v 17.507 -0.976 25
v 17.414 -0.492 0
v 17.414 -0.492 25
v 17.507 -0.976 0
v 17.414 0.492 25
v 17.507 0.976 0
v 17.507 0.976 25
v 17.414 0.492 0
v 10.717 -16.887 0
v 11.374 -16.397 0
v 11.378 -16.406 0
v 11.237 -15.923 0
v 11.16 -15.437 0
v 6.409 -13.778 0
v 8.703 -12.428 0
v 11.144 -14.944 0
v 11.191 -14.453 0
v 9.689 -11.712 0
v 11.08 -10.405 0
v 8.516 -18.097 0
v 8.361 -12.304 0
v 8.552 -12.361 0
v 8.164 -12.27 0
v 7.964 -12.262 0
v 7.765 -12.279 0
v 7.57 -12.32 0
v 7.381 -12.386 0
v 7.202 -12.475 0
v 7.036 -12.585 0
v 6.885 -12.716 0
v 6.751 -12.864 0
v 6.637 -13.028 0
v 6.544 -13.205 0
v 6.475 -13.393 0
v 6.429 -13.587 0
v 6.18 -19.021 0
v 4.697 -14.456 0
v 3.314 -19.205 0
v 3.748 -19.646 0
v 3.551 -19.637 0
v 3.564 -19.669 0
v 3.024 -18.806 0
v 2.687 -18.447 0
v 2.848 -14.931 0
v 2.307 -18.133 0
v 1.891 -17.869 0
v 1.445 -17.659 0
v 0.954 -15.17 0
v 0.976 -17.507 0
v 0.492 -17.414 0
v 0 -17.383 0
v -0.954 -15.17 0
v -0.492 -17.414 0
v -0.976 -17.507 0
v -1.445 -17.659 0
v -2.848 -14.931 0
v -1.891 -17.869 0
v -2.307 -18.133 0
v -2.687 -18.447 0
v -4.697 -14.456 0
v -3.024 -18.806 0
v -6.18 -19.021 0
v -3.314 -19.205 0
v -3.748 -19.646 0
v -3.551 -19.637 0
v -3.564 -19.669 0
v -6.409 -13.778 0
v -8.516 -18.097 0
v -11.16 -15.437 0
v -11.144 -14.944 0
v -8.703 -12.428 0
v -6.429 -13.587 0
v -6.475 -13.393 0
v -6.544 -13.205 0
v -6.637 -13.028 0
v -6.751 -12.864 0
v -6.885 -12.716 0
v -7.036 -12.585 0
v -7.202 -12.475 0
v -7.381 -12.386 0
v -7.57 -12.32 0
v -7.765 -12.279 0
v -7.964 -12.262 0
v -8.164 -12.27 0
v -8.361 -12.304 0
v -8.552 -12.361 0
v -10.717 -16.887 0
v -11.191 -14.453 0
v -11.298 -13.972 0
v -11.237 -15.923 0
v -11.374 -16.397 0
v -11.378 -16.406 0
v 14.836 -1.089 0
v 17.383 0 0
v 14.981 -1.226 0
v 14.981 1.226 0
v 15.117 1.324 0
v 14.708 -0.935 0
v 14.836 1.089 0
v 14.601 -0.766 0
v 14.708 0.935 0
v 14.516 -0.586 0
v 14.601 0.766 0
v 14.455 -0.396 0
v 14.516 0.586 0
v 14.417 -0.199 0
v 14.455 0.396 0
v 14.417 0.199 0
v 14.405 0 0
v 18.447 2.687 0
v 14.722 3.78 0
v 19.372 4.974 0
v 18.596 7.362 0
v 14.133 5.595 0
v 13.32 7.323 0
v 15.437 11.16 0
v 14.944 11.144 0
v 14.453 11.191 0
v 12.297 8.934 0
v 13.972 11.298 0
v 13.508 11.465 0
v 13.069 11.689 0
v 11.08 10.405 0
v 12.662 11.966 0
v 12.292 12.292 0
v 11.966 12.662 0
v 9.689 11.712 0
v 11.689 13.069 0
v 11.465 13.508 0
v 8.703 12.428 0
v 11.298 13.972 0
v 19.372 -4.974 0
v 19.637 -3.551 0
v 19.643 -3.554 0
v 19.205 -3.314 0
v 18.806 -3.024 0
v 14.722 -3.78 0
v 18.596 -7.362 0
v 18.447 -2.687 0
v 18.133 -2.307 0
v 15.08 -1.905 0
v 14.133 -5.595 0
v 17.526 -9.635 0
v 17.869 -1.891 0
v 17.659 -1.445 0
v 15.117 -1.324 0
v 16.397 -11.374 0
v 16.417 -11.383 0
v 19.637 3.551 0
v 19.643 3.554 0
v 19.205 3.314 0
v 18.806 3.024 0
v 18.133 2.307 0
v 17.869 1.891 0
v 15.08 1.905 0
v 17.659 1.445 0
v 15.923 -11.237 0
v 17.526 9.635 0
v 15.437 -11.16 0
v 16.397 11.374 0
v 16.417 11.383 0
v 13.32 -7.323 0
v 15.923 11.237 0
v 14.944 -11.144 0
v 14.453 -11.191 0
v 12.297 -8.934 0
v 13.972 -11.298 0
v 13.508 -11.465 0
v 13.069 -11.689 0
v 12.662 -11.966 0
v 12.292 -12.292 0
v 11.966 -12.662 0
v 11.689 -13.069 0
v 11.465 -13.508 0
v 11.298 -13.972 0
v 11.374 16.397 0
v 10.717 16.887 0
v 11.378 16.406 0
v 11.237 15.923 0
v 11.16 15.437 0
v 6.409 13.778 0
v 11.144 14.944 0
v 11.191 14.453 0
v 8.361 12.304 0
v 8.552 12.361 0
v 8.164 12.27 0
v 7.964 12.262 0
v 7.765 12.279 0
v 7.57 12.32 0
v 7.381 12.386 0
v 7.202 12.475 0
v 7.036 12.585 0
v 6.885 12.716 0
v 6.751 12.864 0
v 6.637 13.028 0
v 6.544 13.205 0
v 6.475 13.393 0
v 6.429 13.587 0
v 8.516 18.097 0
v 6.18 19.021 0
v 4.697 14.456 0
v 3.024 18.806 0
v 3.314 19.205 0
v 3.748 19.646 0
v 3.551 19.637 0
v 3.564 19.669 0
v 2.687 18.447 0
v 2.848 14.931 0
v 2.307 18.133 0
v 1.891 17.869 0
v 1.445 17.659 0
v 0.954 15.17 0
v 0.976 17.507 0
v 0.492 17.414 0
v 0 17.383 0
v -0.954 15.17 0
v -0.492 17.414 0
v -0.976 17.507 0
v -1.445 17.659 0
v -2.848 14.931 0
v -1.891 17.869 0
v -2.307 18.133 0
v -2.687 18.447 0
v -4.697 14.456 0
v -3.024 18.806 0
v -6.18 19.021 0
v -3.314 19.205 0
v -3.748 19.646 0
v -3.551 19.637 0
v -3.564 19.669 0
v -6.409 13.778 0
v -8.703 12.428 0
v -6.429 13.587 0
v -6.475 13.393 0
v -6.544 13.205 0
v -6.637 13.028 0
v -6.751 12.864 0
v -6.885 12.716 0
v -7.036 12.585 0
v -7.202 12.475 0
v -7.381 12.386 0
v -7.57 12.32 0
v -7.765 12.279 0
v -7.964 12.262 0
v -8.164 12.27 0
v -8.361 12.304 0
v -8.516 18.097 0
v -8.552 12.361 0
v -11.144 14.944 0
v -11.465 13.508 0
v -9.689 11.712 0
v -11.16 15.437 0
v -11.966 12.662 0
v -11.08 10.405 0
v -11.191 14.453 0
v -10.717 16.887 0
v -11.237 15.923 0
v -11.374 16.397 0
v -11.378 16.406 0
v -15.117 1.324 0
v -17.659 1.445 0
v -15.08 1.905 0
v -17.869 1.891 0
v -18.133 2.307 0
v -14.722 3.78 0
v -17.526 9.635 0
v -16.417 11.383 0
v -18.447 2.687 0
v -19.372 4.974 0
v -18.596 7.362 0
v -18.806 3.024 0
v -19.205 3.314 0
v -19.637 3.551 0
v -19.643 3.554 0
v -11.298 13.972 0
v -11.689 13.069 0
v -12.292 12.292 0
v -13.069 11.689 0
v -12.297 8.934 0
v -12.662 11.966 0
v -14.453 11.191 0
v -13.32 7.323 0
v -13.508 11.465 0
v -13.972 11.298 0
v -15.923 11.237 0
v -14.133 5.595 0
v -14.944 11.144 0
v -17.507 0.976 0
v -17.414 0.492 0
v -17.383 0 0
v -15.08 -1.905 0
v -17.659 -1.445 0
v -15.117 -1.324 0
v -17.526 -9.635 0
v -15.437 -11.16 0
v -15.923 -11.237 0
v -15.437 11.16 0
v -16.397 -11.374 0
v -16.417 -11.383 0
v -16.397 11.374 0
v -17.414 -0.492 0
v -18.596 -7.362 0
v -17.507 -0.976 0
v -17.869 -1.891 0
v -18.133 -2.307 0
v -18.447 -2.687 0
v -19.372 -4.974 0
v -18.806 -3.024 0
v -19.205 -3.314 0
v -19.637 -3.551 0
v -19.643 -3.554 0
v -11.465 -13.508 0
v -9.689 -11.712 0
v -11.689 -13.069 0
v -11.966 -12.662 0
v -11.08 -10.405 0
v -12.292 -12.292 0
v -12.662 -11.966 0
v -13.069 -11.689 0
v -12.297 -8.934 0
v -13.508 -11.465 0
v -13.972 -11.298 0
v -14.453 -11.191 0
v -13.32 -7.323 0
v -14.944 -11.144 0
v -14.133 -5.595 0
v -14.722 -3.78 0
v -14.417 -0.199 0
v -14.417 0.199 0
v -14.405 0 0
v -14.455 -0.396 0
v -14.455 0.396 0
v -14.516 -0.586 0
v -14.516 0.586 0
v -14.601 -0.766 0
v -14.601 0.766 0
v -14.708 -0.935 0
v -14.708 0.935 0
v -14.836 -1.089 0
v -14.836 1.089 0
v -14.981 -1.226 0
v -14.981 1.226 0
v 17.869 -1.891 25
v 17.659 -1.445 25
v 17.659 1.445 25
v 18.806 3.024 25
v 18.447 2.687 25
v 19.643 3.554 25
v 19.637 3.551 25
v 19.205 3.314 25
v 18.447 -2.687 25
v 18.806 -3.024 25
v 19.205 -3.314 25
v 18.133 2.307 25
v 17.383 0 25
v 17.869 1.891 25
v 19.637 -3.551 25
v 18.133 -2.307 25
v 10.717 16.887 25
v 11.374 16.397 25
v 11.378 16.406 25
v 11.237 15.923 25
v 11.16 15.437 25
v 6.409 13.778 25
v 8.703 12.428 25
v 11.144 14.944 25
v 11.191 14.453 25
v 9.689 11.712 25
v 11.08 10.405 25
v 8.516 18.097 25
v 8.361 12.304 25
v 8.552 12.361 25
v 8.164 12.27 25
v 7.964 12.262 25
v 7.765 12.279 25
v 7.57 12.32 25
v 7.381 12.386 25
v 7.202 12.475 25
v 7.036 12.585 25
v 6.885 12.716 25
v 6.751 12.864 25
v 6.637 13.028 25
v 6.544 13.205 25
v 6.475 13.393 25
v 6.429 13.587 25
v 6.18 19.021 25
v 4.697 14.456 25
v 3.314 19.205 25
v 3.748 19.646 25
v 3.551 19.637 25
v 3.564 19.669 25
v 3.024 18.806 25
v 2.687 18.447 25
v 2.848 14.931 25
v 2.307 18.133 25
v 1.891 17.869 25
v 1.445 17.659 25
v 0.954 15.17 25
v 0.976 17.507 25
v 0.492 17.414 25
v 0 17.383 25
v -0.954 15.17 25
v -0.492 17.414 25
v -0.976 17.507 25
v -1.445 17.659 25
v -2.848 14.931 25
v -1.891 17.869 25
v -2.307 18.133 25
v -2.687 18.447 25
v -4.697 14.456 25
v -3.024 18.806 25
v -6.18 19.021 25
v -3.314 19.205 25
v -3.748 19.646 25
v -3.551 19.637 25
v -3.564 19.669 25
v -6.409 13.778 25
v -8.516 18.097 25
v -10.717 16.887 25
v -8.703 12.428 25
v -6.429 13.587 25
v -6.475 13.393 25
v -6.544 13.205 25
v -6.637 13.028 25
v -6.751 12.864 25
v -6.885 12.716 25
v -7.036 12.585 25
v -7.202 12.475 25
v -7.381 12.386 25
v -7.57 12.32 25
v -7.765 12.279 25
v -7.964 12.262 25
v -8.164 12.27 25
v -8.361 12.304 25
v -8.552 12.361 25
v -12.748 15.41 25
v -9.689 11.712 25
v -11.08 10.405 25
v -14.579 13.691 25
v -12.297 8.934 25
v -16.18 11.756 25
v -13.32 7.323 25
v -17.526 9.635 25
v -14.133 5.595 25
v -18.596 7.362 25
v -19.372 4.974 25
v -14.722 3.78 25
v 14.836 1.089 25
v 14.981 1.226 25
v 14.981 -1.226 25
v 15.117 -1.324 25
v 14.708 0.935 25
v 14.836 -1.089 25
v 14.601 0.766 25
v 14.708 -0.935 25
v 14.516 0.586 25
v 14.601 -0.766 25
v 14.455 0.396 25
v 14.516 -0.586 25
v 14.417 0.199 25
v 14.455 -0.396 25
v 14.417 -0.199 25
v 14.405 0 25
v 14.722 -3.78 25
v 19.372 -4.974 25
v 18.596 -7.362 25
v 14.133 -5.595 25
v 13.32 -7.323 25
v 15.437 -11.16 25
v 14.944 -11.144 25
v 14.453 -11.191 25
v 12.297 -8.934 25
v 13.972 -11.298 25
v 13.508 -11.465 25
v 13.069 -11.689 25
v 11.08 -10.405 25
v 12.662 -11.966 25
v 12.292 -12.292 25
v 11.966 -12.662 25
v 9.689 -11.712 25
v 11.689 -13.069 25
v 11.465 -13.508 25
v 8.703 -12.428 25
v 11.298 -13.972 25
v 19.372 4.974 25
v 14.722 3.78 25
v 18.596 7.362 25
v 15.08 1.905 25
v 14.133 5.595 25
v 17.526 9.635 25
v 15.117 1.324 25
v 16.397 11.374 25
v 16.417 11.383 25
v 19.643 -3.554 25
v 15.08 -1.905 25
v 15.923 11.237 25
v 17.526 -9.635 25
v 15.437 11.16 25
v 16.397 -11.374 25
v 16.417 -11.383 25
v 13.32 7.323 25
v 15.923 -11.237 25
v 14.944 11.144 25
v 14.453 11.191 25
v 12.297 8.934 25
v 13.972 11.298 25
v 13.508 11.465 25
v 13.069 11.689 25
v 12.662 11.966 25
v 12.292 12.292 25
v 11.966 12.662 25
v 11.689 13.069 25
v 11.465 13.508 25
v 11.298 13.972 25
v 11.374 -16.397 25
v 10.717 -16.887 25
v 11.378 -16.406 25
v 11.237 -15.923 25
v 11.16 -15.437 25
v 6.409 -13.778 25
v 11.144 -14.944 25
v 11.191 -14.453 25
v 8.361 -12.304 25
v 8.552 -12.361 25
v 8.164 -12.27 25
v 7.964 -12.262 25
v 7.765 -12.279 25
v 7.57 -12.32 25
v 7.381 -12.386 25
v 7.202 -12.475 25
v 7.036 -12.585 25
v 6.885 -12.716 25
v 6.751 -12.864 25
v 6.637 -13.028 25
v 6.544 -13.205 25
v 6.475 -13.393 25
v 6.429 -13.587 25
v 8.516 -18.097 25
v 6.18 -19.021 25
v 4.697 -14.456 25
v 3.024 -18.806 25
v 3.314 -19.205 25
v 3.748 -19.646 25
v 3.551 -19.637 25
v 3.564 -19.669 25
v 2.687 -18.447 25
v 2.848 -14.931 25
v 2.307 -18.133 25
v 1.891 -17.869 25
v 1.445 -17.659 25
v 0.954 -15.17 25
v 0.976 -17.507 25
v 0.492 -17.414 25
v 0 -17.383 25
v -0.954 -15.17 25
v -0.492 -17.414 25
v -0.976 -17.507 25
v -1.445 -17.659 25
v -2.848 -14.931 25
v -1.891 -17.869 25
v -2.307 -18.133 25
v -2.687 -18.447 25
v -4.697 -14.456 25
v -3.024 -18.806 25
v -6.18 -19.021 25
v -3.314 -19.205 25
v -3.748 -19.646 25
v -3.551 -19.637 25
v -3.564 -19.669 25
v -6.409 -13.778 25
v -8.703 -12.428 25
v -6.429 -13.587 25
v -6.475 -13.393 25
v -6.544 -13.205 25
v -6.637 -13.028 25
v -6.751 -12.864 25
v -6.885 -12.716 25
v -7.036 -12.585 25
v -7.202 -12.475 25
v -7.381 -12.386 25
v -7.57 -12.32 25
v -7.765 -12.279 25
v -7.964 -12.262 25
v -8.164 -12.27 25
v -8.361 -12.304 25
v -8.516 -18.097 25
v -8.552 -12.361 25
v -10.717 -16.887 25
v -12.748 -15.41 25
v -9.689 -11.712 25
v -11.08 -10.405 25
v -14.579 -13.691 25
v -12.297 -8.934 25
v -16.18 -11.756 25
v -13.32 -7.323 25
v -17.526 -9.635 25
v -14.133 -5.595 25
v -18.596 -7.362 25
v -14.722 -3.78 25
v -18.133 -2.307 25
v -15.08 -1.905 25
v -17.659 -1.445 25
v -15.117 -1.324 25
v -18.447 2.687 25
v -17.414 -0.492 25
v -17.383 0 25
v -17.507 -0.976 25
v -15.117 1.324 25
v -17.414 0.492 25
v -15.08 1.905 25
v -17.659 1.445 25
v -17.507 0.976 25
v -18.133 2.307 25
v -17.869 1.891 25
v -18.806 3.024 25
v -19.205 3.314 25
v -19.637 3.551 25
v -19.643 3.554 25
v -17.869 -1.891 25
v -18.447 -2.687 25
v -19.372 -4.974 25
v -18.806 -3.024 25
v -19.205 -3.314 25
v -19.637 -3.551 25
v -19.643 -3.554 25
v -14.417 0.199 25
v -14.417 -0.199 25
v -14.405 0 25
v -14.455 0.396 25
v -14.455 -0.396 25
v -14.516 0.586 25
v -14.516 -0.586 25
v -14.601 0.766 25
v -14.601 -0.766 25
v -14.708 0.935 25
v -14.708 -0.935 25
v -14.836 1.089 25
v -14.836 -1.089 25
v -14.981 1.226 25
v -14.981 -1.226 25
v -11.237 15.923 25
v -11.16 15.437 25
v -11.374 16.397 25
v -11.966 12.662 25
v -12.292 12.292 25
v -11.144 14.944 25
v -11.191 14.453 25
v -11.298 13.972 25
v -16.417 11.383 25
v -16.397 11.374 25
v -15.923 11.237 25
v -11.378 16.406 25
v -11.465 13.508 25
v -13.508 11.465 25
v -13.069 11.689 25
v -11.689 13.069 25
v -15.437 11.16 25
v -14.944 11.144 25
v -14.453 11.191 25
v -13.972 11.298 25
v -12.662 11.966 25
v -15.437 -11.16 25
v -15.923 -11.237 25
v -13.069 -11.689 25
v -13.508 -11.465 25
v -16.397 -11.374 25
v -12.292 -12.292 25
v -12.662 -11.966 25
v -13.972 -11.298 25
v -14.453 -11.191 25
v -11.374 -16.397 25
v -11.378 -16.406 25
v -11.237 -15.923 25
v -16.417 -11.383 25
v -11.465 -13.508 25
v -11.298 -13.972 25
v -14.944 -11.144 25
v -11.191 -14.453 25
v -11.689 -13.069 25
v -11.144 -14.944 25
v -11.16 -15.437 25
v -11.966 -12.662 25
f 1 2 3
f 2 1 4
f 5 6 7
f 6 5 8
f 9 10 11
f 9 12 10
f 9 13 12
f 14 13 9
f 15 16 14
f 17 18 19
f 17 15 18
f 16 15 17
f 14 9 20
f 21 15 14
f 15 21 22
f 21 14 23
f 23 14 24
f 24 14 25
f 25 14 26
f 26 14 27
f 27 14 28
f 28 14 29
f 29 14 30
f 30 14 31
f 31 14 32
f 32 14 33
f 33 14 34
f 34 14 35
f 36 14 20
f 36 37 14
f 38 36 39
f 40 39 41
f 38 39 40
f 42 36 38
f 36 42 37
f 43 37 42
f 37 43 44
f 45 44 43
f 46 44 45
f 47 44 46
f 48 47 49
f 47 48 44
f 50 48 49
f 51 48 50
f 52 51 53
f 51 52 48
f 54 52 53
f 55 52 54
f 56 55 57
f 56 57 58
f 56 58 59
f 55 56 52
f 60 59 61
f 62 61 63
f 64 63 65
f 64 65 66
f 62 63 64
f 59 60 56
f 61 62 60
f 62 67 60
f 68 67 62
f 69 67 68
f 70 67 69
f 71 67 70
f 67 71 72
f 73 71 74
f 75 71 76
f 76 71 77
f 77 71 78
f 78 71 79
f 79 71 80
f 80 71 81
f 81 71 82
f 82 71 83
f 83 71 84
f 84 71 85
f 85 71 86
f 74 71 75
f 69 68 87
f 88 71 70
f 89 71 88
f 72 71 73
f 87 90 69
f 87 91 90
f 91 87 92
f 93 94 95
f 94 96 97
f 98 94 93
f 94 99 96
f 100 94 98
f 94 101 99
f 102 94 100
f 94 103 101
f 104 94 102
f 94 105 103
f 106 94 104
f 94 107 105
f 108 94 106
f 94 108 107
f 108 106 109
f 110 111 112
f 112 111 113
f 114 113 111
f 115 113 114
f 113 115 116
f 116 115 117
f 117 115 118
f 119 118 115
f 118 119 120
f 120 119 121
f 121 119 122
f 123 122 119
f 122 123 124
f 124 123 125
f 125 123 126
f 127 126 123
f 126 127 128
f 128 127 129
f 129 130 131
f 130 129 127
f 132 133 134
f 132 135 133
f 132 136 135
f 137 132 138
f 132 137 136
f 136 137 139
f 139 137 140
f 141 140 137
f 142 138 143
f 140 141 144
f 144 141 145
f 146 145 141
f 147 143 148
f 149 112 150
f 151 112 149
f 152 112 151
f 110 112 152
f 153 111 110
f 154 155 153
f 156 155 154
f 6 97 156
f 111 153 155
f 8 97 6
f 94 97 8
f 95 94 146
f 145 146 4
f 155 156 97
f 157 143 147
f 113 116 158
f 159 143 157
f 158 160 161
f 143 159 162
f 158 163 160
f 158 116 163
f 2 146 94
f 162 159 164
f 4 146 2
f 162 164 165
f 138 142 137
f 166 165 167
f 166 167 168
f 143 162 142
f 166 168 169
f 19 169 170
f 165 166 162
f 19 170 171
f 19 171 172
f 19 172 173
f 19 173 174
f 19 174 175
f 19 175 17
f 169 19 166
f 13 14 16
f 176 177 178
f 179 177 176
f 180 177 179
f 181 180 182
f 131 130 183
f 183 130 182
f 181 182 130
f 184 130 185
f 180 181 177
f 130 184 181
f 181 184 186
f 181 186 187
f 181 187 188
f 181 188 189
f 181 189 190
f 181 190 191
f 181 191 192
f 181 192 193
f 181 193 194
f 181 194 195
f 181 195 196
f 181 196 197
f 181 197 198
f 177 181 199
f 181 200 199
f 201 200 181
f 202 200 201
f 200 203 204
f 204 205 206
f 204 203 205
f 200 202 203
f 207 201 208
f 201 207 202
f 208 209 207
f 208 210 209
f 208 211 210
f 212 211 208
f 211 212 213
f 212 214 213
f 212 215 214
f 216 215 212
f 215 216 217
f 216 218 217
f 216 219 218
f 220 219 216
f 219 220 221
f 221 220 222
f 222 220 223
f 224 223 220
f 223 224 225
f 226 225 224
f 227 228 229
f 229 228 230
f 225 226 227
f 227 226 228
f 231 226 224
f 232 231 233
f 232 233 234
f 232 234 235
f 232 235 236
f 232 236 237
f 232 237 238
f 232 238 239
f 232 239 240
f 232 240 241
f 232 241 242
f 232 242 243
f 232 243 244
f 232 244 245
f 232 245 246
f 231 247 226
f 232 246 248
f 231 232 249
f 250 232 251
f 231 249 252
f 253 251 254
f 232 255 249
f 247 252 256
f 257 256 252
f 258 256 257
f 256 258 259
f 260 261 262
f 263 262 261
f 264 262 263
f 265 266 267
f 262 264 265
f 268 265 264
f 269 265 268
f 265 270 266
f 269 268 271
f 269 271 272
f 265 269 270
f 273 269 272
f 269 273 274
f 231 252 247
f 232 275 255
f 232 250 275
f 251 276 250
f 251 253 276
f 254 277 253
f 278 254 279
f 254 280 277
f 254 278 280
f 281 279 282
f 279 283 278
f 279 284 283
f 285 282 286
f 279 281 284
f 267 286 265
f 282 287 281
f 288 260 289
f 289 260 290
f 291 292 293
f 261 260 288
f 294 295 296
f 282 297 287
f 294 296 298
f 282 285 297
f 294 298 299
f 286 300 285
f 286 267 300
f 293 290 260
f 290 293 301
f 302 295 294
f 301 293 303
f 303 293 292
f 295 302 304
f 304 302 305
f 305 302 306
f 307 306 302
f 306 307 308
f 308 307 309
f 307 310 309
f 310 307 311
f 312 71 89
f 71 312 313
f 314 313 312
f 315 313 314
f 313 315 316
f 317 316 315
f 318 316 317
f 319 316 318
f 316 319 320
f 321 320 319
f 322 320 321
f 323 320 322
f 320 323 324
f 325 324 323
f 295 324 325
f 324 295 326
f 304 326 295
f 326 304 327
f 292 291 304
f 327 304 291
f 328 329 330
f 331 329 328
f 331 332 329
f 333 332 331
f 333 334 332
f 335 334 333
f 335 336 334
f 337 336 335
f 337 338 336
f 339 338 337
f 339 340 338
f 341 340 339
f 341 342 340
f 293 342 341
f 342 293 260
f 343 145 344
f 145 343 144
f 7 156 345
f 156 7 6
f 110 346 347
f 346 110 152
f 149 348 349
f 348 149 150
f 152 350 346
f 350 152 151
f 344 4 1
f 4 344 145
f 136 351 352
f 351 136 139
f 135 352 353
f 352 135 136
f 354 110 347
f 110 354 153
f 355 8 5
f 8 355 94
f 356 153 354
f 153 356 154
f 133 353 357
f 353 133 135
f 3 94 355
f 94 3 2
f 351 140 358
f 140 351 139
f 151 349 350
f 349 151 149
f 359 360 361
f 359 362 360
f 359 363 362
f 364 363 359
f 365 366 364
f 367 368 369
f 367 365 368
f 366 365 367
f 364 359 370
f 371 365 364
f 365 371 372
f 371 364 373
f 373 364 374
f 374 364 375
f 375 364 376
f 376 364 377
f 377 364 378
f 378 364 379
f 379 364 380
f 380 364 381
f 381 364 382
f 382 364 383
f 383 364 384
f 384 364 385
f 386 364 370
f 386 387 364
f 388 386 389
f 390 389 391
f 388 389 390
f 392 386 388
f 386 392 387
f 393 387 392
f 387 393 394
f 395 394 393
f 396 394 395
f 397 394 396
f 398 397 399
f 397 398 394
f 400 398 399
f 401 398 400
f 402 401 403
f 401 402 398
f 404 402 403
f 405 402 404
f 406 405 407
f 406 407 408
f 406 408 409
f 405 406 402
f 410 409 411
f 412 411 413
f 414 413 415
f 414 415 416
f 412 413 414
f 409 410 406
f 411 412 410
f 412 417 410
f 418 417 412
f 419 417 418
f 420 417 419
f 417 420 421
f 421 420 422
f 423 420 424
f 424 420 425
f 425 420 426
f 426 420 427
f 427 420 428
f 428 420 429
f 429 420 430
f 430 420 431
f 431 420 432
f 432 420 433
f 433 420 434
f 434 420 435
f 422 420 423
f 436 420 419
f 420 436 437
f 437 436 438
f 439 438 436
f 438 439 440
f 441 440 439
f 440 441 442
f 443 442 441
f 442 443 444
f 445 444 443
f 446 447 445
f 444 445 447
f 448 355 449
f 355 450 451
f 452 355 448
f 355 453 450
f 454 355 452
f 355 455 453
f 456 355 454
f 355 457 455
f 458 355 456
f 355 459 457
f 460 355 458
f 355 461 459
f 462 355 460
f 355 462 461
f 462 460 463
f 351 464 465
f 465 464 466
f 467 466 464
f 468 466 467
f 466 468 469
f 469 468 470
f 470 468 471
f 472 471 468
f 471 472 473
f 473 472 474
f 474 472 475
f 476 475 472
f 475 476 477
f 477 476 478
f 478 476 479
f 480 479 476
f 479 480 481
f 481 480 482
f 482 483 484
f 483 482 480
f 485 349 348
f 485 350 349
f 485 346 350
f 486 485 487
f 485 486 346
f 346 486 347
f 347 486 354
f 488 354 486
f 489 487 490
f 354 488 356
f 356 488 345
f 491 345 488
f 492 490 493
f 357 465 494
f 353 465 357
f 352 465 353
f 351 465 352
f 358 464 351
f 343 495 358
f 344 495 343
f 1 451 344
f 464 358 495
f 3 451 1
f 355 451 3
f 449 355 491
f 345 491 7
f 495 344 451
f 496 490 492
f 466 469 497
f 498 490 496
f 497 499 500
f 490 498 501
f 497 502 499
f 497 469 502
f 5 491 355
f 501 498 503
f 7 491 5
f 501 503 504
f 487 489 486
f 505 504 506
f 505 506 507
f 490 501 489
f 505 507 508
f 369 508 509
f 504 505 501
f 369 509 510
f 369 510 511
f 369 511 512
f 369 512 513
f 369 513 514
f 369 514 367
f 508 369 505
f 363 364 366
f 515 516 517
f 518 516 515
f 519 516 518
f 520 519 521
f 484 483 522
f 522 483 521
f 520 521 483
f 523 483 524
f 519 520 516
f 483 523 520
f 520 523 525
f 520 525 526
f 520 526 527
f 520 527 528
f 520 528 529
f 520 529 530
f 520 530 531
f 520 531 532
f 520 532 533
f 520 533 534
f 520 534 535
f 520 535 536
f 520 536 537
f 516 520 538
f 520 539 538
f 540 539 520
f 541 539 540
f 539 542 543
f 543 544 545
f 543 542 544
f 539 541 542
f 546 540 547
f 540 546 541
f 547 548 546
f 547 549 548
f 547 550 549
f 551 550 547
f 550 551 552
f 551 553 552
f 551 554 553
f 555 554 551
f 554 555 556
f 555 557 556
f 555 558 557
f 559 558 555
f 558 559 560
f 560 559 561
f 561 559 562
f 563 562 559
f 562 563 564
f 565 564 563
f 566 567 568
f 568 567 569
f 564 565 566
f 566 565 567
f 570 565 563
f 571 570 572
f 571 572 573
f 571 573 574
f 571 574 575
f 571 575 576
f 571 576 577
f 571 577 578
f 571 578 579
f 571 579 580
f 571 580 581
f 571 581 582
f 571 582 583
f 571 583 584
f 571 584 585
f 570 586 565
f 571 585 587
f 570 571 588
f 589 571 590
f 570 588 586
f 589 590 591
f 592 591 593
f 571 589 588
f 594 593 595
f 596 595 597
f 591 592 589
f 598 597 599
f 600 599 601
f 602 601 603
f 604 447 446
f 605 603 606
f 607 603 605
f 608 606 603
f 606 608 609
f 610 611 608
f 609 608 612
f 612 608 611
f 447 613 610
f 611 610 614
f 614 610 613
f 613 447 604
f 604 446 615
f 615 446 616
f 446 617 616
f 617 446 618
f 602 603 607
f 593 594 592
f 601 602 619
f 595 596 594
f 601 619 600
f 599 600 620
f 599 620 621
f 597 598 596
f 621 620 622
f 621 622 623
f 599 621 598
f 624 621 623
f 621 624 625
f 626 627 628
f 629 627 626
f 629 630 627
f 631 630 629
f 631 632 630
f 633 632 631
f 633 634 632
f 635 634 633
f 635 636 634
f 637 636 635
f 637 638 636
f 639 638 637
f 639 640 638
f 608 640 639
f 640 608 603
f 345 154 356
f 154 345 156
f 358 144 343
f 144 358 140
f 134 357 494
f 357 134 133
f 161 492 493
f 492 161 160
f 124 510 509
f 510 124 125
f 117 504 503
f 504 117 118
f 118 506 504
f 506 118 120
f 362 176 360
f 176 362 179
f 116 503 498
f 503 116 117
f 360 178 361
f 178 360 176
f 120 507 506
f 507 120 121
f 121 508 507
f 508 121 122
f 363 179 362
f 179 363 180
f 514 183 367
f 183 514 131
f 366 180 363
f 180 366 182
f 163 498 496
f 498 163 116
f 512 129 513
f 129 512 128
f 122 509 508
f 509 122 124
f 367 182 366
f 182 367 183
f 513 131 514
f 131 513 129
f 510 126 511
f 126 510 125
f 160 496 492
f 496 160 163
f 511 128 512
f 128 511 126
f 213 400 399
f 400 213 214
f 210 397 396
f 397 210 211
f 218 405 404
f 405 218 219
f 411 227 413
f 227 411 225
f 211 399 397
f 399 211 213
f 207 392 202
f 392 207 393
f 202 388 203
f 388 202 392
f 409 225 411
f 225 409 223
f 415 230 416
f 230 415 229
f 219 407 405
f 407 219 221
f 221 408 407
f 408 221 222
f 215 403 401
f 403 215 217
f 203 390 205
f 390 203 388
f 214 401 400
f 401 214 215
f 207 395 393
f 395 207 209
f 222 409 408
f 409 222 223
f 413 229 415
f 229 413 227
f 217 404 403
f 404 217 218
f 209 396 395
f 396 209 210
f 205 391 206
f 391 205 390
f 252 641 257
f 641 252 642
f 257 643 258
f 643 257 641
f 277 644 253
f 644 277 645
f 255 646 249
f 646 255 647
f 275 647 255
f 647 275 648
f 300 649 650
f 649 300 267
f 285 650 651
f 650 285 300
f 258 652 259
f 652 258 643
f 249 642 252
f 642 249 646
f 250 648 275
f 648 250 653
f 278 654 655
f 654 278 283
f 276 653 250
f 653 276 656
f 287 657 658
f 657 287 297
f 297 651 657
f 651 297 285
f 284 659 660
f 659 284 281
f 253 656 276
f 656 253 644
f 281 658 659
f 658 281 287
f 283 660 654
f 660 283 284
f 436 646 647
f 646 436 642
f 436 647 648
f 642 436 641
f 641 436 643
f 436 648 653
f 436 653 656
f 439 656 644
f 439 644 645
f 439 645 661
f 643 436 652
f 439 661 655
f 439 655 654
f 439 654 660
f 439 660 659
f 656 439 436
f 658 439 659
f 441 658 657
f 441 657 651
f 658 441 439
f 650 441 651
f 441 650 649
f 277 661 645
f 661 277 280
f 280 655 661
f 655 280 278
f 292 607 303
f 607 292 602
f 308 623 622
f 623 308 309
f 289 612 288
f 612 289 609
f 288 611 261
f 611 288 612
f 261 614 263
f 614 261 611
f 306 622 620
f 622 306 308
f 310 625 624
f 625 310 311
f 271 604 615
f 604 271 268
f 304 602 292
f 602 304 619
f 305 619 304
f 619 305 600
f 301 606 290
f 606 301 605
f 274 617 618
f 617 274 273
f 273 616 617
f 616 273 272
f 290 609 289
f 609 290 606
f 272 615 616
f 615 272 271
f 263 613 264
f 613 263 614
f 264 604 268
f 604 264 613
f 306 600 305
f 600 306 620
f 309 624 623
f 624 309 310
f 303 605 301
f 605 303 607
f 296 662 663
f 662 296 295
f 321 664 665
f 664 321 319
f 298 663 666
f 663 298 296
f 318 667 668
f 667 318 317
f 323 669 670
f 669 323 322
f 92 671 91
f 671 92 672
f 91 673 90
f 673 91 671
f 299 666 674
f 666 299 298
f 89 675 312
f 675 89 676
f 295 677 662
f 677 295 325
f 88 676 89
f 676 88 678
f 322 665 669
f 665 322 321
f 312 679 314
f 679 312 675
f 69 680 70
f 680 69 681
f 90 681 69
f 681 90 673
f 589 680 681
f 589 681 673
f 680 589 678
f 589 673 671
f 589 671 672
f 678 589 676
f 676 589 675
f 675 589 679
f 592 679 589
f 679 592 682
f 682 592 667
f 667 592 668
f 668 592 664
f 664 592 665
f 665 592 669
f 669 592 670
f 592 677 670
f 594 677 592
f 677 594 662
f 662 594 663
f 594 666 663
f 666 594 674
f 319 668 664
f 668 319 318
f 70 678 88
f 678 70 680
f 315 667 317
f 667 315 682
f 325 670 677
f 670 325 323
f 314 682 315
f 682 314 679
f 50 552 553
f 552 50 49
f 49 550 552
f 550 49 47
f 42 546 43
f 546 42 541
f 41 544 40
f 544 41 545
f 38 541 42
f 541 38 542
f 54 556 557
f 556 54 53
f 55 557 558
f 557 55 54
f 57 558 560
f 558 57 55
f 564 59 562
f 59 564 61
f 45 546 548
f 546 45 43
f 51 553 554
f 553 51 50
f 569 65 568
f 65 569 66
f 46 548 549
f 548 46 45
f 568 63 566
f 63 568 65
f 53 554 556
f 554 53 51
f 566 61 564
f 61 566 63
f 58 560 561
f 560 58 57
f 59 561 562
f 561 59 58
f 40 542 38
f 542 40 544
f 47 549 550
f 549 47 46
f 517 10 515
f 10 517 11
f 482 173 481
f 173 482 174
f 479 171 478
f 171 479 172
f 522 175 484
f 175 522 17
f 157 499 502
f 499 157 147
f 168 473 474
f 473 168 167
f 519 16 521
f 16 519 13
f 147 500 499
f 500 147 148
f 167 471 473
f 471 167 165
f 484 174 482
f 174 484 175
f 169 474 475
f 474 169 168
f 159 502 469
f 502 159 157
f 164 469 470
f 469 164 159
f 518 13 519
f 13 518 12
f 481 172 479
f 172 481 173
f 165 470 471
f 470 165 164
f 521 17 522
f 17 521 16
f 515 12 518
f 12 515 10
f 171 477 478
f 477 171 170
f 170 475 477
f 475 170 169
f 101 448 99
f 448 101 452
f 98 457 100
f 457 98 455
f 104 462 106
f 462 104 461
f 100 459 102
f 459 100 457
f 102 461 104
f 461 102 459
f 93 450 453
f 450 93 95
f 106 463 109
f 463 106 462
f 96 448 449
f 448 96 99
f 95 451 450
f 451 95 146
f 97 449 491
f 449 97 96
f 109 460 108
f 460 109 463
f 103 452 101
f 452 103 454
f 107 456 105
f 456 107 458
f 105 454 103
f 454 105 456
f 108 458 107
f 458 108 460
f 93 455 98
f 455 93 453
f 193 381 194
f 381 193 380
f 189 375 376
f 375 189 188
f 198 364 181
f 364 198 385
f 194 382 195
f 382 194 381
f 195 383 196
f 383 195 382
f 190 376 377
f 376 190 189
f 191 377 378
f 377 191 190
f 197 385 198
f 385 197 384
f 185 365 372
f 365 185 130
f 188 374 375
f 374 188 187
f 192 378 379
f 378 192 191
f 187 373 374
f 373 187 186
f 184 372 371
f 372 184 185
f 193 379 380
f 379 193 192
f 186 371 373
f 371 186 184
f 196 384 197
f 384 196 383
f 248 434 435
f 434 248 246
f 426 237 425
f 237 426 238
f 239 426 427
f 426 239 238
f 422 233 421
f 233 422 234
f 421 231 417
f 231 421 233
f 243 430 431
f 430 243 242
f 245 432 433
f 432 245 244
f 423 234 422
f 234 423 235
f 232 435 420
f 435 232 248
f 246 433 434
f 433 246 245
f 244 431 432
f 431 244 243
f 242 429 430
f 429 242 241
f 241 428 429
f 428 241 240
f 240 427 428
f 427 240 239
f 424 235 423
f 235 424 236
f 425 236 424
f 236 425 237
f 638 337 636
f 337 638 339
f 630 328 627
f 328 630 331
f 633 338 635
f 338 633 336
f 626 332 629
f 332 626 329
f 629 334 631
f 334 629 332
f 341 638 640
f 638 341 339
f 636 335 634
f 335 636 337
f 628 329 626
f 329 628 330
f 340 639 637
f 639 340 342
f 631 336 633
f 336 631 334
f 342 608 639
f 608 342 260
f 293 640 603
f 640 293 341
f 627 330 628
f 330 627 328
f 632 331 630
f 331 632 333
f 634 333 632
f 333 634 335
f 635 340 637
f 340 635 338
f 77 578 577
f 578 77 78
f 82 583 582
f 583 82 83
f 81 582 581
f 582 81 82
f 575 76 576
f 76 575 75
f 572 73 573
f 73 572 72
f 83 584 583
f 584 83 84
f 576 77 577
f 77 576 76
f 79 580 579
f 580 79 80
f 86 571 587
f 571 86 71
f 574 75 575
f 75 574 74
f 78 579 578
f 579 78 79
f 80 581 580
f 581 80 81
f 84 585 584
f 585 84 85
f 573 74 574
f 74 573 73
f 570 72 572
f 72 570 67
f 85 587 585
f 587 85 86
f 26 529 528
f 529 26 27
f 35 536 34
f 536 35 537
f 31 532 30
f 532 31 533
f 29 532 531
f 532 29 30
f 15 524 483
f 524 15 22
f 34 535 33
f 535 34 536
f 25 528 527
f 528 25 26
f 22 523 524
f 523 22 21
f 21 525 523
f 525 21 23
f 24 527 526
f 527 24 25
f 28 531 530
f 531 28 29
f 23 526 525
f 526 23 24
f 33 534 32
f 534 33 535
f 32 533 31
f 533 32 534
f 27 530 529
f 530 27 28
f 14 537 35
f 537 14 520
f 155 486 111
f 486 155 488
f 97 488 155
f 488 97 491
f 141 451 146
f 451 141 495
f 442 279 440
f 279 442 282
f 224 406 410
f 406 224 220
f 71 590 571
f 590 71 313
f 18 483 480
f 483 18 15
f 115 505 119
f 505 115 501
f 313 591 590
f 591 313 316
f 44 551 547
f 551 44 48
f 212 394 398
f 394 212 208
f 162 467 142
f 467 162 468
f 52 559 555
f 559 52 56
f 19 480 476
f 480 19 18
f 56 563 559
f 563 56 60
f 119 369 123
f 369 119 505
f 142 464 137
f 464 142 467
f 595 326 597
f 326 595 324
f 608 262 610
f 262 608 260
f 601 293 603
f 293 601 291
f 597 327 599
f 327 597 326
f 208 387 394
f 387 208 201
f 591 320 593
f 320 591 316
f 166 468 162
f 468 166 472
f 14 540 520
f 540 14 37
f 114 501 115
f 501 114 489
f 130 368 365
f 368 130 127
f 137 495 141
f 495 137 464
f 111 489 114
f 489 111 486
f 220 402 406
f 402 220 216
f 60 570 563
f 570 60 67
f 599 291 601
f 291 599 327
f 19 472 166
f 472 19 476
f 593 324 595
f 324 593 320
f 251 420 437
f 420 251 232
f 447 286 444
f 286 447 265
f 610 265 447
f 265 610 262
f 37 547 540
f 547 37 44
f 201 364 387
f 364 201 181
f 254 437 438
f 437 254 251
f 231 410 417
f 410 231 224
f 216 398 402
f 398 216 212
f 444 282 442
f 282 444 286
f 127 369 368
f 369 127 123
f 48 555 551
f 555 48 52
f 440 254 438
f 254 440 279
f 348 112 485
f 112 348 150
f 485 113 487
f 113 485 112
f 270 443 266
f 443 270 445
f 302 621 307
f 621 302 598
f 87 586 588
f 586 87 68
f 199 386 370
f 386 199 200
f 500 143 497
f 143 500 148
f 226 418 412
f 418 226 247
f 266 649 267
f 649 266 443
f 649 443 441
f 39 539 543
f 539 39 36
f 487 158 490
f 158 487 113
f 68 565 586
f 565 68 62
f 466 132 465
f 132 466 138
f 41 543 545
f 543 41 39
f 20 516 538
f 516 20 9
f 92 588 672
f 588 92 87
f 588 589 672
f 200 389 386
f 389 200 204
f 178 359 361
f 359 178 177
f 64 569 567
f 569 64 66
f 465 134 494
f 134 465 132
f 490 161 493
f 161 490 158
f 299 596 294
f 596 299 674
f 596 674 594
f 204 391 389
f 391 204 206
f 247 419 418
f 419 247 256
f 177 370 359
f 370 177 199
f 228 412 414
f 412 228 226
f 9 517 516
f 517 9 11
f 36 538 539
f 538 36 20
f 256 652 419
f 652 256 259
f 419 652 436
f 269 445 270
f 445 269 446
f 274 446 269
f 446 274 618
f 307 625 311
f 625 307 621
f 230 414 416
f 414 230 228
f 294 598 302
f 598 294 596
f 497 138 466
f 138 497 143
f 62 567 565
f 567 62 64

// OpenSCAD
//Radius of the wheel inner
wheel_radius=15.2; 
//Radius of the wheel outer
wheel_radius2=20; 

//Height of the wheel inner
wheel_height=25;
//Height of the wheel outer
wheel_height2=25;

//Number of steps on the wheel for grip and numbers
wheel_steps=6; // inner
wheel_steps2=8; // outer

//When printing steps numbers, which number to start with (offset from 0)
wheel_steps_start=0;    // inner
wheel_steps_start2=0;   // outer

$fn=50;

module regular_polygon(order, r=1){
 	angles=[ for (i = [0:order-1]) i*(360/order) ];
 	coords=[ for (th=angles) [r*cos(th), r*sin(th)] ];
 	polygon(coords);
 }
 
 
union()  {
    translate([0,0,wheel_height]);  // inner
    translate([0,0,wheel_height2]); // outer
            // start outer
     difference() {
         cylinder(wheel_height2,wheel_radius2,wheel_radius2);
         grip_radius2=2*3.14*wheel_radius2/4/wheel_steps2; 
         grip_translate2=wheel_radius2+1/3*grip_radius2; 

         for(count=[0:1:wheel_steps2-1]) {
             angle=360/wheel_steps2*count;
             num=count+wheel_steps_start2;
             rotate(angle,[0,0,1]) {
             translate([grip_translate2,0,0]) cylinder(wheel_height2,grip_radius2,grip_radius2);
             }
         } 
        // start inner
            difference() {
                cylinder(wheel_height,wheel_radius,wheel_radius);
                grip_radius=1*3.14*wheel_radius/5/wheel_steps; 
                grip_translate=wheel_radius+1/2*grip_radius; 

                for(count=[0:1:wheel_steps-1]) {
                    angle=360/wheel_steps*count;
                    num=count+wheel_steps_start;
                    rotate(angle,[0,0,1]) {
                    translate([grip_translate,0,0]) cylinder(wheel_height,grip_radius,grip_radius);
                    }
                   } 
            }  // end inner
     }  // end outer
 } 
